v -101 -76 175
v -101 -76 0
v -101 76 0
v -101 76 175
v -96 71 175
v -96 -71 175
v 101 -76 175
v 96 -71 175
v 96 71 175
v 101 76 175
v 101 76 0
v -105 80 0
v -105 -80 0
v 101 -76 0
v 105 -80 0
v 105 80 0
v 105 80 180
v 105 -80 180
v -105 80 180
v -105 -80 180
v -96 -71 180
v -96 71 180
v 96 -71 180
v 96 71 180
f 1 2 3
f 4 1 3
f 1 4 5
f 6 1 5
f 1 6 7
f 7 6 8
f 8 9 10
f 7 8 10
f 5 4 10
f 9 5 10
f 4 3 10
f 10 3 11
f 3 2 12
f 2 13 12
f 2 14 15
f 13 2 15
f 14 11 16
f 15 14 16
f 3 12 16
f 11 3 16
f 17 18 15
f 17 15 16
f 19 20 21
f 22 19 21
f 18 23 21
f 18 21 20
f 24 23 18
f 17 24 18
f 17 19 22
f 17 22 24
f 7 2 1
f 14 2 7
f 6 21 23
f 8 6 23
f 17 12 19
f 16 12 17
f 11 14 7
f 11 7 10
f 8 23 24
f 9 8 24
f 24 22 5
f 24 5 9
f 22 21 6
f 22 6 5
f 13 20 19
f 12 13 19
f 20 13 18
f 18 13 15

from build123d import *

# Parameters (mm, degrees)
F0_W     = 210
F0_H     = 160
F1_DEPTH = 180
F2_T     = -4
F3_W     = 210
F3_H     = 160
F3_W_2   = 191.999994
F3_H_2   = 141.999994
F4_DEPTH = 5


with BuildPart() as f1:
    # F0 (on Top) → F1 (new body)
    with BuildSketch(Plane.XY):
        Rectangle(F0_W, F0_H)
    extrude(amount=F1_DEPTH)

    # F2
    f2_openings = [f1.faces().sort_by_distance(p)[0] for p in [
        (0, 0, 180),
        (0, 0, 0),
    ]]
    offset(amount=F2_T, openings=f2_openings)

    # F3 (on face) → F4 (join)
    with BuildSketch(Plane.XY.offset(180)):
        Rectangle(F3_W, F3_H)
        Rectangle(F3_W_2, F3_H_2, mode=Mode.SUBTRACT)
    extrude(amount=-F4_DEPTH)


solid = f1.part
